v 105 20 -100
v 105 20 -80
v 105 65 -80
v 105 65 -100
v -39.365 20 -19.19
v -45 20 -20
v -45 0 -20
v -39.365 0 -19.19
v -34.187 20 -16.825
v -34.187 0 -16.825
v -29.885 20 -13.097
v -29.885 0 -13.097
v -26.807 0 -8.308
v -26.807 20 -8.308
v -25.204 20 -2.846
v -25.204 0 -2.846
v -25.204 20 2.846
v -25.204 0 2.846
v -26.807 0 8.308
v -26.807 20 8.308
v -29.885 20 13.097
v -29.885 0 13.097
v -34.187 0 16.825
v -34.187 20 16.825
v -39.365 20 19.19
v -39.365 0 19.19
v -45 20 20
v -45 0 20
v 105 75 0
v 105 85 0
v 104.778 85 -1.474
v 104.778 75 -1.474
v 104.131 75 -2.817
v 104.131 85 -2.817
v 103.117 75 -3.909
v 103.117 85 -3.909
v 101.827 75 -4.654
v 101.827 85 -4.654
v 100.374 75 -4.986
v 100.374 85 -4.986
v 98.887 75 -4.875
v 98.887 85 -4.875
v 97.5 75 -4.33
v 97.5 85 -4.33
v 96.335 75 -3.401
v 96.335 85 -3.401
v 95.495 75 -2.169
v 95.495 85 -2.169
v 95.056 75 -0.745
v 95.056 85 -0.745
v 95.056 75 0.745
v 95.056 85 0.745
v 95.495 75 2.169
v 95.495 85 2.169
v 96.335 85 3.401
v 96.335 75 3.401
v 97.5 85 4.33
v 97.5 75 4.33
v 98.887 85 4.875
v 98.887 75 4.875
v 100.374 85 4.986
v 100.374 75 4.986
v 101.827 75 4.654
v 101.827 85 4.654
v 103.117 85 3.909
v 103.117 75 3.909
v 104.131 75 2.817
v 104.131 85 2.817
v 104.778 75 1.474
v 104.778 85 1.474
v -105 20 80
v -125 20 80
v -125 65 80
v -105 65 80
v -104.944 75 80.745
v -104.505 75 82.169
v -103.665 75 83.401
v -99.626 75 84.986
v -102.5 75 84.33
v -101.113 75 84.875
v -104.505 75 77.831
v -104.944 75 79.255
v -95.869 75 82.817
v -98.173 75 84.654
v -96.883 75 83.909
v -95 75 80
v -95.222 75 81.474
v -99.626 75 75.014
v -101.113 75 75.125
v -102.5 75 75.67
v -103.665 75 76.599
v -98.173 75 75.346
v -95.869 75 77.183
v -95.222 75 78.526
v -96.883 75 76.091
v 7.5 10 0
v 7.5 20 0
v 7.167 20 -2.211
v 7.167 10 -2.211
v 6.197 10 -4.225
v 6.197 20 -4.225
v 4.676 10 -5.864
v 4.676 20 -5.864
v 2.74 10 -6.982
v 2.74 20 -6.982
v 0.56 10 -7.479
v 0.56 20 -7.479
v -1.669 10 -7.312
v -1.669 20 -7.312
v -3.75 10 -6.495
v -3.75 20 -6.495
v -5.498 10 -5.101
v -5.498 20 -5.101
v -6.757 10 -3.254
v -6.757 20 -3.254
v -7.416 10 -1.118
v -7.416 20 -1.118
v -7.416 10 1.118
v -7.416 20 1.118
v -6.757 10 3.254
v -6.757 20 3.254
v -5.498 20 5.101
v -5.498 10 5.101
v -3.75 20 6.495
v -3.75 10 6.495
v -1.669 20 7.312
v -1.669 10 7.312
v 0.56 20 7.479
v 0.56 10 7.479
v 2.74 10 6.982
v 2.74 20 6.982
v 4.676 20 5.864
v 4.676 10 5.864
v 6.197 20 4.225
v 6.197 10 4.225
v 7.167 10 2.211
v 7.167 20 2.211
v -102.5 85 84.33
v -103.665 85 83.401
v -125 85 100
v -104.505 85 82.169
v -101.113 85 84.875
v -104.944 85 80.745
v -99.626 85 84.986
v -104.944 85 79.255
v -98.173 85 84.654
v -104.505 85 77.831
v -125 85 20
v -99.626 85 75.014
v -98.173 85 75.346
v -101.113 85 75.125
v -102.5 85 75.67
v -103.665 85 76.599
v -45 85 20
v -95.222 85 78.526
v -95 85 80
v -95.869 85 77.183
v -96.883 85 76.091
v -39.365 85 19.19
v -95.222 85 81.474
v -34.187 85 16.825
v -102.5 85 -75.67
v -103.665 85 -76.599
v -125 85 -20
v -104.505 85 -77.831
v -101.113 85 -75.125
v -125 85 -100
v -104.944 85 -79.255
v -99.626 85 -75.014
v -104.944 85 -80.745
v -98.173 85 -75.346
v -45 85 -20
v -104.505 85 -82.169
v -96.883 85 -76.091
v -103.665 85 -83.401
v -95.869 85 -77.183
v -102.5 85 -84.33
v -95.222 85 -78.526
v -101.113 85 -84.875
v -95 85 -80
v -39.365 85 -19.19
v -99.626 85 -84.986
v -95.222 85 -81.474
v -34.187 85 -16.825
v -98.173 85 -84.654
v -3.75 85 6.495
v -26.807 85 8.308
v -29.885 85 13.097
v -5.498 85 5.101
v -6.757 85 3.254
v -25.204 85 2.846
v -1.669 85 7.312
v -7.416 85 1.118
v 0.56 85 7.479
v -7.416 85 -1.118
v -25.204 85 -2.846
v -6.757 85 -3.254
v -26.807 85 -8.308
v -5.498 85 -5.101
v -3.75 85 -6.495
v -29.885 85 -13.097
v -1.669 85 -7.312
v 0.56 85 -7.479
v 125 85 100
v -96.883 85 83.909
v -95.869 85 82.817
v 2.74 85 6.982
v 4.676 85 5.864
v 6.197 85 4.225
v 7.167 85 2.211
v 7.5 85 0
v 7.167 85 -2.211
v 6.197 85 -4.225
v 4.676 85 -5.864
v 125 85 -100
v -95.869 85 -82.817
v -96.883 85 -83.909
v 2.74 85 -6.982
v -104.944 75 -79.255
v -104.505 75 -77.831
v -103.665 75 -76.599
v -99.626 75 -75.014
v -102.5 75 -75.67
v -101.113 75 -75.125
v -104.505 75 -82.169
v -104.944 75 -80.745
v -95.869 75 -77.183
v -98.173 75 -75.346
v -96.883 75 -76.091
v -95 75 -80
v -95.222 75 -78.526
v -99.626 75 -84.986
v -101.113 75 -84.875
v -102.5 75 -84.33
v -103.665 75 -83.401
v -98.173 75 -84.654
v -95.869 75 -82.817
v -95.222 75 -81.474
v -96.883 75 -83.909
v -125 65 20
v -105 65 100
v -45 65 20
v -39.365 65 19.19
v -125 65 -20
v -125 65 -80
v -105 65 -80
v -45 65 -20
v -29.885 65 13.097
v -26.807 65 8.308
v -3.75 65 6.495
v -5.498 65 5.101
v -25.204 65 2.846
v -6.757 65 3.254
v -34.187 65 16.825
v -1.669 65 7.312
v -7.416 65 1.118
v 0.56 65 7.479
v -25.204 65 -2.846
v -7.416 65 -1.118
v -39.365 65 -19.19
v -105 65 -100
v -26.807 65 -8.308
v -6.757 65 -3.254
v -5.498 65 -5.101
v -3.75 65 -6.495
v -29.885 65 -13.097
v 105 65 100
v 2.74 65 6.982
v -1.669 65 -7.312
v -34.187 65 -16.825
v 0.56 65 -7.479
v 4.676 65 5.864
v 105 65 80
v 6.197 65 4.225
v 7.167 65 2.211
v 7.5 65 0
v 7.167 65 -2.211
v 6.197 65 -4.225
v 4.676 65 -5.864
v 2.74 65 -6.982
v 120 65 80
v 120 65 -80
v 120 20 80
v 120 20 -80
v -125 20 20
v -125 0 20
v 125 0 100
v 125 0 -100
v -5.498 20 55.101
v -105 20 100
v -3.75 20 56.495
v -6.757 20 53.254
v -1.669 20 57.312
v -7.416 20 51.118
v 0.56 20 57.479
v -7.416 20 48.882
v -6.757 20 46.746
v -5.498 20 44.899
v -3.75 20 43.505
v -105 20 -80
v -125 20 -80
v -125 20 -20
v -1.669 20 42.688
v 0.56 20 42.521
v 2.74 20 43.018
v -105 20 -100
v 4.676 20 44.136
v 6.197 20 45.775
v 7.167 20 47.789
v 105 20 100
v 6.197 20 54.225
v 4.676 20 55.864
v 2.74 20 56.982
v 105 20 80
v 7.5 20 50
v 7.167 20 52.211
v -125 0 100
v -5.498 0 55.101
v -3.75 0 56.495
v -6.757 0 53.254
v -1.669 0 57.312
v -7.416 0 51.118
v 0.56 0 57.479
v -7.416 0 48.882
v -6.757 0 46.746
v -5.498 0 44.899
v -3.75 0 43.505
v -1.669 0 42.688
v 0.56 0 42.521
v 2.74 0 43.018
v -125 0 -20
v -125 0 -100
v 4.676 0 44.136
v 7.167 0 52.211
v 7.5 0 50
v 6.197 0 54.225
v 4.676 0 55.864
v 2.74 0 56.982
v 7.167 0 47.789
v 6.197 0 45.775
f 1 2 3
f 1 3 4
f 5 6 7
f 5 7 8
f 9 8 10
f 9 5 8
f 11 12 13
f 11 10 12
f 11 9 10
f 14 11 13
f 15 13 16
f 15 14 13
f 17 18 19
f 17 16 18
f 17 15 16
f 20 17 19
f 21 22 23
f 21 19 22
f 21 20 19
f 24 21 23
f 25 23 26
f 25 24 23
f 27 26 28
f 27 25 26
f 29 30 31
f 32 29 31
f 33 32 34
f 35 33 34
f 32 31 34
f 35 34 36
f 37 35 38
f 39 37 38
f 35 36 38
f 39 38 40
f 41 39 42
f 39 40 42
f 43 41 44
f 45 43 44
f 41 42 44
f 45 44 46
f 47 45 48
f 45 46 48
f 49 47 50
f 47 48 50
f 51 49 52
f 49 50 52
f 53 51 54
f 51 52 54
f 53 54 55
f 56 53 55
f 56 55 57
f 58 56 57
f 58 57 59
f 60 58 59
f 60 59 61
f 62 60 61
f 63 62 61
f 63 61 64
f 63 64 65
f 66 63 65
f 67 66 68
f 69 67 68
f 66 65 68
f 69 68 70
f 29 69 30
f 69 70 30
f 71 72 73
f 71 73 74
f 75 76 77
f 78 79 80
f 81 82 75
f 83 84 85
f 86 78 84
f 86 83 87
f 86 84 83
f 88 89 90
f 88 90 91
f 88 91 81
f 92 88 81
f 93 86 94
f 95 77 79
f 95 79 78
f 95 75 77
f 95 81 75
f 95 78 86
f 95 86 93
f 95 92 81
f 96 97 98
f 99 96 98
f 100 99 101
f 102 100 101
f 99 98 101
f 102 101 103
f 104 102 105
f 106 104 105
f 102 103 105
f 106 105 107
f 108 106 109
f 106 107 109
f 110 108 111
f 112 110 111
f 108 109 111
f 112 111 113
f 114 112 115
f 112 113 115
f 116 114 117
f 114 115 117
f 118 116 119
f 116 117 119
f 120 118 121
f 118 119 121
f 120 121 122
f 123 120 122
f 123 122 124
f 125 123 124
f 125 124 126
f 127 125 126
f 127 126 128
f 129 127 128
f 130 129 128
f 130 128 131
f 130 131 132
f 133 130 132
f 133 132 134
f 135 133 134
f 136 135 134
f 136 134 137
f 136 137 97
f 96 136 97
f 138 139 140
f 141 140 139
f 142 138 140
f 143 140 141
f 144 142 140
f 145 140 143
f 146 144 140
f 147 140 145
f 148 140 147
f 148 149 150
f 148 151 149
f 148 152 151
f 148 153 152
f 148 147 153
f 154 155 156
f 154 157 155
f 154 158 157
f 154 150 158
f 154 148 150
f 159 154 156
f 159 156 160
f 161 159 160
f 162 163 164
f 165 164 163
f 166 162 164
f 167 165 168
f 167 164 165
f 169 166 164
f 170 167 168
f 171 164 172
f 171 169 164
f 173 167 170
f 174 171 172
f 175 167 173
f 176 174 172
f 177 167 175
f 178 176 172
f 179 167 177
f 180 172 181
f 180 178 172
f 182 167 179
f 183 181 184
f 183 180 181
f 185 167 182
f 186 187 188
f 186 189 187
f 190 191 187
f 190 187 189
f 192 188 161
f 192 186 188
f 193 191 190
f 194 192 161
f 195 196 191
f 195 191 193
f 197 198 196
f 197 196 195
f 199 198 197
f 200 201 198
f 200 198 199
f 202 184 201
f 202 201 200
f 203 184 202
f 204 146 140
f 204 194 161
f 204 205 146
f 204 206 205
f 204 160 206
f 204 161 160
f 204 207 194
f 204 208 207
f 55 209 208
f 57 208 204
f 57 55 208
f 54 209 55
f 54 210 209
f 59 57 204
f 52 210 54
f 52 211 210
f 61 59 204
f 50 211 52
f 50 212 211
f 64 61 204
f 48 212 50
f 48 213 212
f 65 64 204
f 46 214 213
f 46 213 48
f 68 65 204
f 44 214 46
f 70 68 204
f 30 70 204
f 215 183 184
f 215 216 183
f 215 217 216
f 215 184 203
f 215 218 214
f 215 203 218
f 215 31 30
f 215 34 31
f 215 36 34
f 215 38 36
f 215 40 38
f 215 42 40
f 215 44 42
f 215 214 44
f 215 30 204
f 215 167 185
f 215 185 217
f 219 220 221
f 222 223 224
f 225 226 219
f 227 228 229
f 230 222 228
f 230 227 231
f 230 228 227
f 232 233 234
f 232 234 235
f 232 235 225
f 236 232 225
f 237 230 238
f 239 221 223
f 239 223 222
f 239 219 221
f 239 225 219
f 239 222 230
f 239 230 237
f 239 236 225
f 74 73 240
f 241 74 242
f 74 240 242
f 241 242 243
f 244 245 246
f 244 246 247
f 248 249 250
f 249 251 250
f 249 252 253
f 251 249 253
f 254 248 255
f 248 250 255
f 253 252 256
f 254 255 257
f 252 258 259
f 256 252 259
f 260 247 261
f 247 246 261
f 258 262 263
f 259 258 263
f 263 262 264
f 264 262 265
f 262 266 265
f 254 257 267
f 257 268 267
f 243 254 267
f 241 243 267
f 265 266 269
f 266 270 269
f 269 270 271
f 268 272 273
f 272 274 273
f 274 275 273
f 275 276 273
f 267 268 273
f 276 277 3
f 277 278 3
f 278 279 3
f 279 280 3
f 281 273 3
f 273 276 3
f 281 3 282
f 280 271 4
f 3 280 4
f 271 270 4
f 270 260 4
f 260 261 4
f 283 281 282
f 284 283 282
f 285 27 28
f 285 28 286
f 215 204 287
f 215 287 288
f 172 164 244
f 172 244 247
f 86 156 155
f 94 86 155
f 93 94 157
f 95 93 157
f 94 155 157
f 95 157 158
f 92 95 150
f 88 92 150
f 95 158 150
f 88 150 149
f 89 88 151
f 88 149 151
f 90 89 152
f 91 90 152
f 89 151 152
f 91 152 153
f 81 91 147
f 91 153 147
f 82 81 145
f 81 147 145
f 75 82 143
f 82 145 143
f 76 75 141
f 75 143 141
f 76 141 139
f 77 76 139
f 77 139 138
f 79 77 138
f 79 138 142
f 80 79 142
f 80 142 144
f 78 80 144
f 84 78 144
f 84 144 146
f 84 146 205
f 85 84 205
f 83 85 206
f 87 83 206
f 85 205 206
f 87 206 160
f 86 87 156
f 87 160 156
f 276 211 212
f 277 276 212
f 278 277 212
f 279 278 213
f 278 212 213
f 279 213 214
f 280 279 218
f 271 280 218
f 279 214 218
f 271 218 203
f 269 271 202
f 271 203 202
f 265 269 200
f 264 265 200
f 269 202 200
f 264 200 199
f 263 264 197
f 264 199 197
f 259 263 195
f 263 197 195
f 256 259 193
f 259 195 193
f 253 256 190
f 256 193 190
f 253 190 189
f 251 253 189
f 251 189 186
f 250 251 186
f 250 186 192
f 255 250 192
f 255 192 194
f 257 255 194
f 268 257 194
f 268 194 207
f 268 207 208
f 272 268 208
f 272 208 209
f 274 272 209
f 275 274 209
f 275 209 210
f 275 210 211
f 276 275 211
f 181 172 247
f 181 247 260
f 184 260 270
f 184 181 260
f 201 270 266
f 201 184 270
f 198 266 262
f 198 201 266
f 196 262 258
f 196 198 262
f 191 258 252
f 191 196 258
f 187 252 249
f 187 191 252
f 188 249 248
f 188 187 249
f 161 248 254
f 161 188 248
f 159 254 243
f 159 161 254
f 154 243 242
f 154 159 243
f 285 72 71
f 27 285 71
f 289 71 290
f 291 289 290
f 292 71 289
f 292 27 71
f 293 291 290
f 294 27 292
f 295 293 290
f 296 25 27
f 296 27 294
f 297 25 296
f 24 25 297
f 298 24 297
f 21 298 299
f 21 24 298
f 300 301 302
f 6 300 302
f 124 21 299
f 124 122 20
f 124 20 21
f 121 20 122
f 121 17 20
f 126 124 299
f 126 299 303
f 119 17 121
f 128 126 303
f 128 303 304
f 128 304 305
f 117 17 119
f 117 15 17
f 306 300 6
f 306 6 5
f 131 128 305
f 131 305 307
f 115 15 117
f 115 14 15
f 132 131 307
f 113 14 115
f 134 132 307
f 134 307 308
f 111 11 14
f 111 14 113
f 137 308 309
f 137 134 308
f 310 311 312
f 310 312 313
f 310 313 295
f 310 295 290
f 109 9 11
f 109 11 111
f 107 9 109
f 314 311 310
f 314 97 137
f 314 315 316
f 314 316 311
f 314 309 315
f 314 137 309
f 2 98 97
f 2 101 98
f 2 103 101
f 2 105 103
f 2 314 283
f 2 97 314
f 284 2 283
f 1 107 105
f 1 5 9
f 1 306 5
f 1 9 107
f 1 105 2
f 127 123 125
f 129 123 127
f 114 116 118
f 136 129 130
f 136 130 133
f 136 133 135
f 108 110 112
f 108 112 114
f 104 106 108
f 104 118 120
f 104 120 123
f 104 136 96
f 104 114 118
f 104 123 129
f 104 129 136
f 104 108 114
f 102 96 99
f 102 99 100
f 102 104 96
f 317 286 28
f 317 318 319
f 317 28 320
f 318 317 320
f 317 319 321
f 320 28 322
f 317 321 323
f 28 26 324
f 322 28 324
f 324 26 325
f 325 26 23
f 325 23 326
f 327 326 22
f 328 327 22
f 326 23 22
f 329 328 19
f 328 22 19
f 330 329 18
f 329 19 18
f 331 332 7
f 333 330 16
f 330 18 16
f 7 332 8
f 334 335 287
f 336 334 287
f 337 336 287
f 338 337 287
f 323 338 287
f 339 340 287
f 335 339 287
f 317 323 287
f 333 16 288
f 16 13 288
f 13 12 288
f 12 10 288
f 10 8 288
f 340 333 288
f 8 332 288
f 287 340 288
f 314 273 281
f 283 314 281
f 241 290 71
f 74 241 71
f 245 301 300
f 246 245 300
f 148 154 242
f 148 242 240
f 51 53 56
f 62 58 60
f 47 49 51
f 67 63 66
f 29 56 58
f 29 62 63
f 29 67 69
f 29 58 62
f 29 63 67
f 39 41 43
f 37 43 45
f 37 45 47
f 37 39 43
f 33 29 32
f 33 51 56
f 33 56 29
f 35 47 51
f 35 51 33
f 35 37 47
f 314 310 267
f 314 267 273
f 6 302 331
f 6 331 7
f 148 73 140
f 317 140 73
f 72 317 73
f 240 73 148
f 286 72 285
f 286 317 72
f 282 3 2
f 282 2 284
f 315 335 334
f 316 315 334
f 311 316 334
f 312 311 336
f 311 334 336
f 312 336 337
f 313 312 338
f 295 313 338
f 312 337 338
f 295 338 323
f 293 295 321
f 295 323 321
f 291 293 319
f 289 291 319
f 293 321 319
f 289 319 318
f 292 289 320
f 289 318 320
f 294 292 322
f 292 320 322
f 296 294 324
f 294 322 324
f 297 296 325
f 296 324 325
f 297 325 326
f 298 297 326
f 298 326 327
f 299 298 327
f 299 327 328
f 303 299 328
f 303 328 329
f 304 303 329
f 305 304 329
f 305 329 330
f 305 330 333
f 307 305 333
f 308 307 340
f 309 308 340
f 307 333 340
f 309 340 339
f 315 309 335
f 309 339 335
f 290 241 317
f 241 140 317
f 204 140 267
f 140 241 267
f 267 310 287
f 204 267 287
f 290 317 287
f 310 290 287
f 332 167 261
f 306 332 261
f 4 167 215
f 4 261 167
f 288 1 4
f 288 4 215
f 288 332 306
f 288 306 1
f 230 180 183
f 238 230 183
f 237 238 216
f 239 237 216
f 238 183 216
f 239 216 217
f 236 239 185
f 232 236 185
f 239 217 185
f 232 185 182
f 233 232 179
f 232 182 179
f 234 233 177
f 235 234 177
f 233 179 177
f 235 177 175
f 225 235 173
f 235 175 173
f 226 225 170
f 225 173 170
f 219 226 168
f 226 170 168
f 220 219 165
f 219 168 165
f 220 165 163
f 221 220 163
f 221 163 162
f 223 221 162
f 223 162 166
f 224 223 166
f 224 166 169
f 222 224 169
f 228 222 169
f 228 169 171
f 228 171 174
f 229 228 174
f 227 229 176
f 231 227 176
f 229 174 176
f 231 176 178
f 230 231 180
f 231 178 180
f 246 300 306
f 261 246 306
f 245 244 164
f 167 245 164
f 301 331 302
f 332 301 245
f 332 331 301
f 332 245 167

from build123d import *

# Parameters (mm, degrees)
SKETCH1_W               = 250
SKETCH1_H               = 200
BOSS_EXTRUDE1_DEPTH     = 20
BOSS_EXTRUDE2_START     = 65
SKETCH1_2_W             = 250
SKETCH1_2_H             = 200
BOSS_EXTRUDE2_DEPTH     = 20
SKETCH2_W               = 20
SKETCH2_H               = 20
BOSS_EXTRUDE3_DEPTH     = 45
SKETCH4_R               = 5
CUT_EXTRUDE1_DEPTH      = 10
SKETCH5_R               = 7.5
CUT_EXTRUDE2_DEPTH      = 75
CUT_EXTRUDE3_DEPTH      = 1
CUT_EXTRUDE3_DEPTH_BACK = 86
SKETCH7_R               = 7.5
CUT_EXTRUDE4_DEPTH      = 20
SKETCH8_W               = 160
SKETCH8_H               = 45
BOSS_EXTRUDE4_DEPTH     = 5


with BuildPart() as part:
    # Sketch1 → Boss-Extrude1 (new body)
    with BuildSketch(Plane(origin=(0, 0, 0), x_dir=(1, 0, 0), z_dir=(0, 1, 0))):
        Rectangle(SKETCH1_W, SKETCH1_H)
    extrude(amount=BOSS_EXTRUDE1_DEPTH)



with BuildPart() as body_2:
    # Sketch1<2> → Boss-Extrude2 (new body)
    with BuildSketch(Plane(origin=(0, 0, 0), x_dir=(1, 0, 0), z_dir=(0, 1, 0)).offset(BOSS_EXTRUDE2_START)):
        Rectangle(SKETCH1_2_W, SKETCH1_2_H)
    extrude(amount=BOSS_EXTRUDE2_DEPTH)


with BuildPart() as part_1:
    add(part.part)

    add(body_2.part)  # Boss-Extrude3 merges body 2
    # Sketch2 → Boss-Extrude3 (add)
    with BuildSketch(Plane(origin=(0, 20, 0), x_dir=(1, 0, 0), z_dir=(0, 1, 0))):
        with Locations((-115, -90)):
            Rectangle(SKETCH2_W, SKETCH2_H)
        with Locations((-115, 90)):
            Rectangle(SKETCH2_W, SKETCH2_H)
        with Locations((115, 90)):
            Rectangle(SKETCH2_W, SKETCH2_H)
        with Locations((115, -90)):
            Rectangle(SKETCH2_W, SKETCH2_H)
    extrude(amount=BOSS_EXTRUDE3_DEPTH)

    # Sketch4 → Cut-Extrude1 (cut)
    with BuildSketch(Plane(origin=(0, 85, 0), x_dir=(1, 0, 0), z_dir=(0, 1, 0))):
        with Locations((100, 0)):
            Circle(SKETCH4_R)
        with Locations((-100, -80)):
            Circle(SKETCH4_R)
        with Locations((-100, 80)):
            Circle(SKETCH4_R)
    extrude(amount=-CUT_EXTRUDE1_DEPTH, mode=Mode.SUBTRACT)

    # Sketch5 → Cut-Extrude2 (cut)
    with BuildSketch(Plane(origin=(0, 85, 0), x_dir=(1, 0, 0), z_dir=(0, 1, 0))):
        Circle(SKETCH5_R)
    extrude(amount=-CUT_EXTRUDE2_DEPTH, mode=Mode.SUBTRACT)

    # Sketch6 → Cut-Extrude3 (cut, two sides)
    with BuildSketch(Plane(origin=(0, 85, 0), x_dir=(1, 0, 0), z_dir=(0, 1, 0))) as cut_extrude3_sk:
        with BuildLine():
            Line((-125, 20), (-45, 20))
            ThreePointArc((-45, 20), (-25, 0), (-45, -20))
            Line((-45, -20), (-125, -20))
            Line((-125, -20), (-125, 20))
        make_face()
    extrude(amount=CUT_EXTRUDE3_DEPTH, mode=Mode.SUBTRACT)
    extrude(cut_extrude3_sk.sketch, amount=-CUT_EXTRUDE3_DEPTH_BACK, mode=Mode.SUBTRACT)

    # Sketch7 → Cut-Extrude4 (cut)
    with BuildSketch(Plane.XZ):
        with Locations((0, 50)):
            Circle(SKETCH7_R)
    extrude(amount=-CUT_EXTRUDE4_DEPTH, mode=Mode.SUBTRACT)

    # Sketch8 → Boss-Extrude4 (add)
    with BuildSketch(Plane(origin=(125, 0, 0), x_dir=(0, 0, -1), z_dir=(1, 0, 0))):
        with Locations((0, 42.5)):
            Rectangle(SKETCH8_W, SKETCH8_H)
    extrude(amount=-BOSS_EXTRUDE4_DEPTH)


solid = part_1.part
